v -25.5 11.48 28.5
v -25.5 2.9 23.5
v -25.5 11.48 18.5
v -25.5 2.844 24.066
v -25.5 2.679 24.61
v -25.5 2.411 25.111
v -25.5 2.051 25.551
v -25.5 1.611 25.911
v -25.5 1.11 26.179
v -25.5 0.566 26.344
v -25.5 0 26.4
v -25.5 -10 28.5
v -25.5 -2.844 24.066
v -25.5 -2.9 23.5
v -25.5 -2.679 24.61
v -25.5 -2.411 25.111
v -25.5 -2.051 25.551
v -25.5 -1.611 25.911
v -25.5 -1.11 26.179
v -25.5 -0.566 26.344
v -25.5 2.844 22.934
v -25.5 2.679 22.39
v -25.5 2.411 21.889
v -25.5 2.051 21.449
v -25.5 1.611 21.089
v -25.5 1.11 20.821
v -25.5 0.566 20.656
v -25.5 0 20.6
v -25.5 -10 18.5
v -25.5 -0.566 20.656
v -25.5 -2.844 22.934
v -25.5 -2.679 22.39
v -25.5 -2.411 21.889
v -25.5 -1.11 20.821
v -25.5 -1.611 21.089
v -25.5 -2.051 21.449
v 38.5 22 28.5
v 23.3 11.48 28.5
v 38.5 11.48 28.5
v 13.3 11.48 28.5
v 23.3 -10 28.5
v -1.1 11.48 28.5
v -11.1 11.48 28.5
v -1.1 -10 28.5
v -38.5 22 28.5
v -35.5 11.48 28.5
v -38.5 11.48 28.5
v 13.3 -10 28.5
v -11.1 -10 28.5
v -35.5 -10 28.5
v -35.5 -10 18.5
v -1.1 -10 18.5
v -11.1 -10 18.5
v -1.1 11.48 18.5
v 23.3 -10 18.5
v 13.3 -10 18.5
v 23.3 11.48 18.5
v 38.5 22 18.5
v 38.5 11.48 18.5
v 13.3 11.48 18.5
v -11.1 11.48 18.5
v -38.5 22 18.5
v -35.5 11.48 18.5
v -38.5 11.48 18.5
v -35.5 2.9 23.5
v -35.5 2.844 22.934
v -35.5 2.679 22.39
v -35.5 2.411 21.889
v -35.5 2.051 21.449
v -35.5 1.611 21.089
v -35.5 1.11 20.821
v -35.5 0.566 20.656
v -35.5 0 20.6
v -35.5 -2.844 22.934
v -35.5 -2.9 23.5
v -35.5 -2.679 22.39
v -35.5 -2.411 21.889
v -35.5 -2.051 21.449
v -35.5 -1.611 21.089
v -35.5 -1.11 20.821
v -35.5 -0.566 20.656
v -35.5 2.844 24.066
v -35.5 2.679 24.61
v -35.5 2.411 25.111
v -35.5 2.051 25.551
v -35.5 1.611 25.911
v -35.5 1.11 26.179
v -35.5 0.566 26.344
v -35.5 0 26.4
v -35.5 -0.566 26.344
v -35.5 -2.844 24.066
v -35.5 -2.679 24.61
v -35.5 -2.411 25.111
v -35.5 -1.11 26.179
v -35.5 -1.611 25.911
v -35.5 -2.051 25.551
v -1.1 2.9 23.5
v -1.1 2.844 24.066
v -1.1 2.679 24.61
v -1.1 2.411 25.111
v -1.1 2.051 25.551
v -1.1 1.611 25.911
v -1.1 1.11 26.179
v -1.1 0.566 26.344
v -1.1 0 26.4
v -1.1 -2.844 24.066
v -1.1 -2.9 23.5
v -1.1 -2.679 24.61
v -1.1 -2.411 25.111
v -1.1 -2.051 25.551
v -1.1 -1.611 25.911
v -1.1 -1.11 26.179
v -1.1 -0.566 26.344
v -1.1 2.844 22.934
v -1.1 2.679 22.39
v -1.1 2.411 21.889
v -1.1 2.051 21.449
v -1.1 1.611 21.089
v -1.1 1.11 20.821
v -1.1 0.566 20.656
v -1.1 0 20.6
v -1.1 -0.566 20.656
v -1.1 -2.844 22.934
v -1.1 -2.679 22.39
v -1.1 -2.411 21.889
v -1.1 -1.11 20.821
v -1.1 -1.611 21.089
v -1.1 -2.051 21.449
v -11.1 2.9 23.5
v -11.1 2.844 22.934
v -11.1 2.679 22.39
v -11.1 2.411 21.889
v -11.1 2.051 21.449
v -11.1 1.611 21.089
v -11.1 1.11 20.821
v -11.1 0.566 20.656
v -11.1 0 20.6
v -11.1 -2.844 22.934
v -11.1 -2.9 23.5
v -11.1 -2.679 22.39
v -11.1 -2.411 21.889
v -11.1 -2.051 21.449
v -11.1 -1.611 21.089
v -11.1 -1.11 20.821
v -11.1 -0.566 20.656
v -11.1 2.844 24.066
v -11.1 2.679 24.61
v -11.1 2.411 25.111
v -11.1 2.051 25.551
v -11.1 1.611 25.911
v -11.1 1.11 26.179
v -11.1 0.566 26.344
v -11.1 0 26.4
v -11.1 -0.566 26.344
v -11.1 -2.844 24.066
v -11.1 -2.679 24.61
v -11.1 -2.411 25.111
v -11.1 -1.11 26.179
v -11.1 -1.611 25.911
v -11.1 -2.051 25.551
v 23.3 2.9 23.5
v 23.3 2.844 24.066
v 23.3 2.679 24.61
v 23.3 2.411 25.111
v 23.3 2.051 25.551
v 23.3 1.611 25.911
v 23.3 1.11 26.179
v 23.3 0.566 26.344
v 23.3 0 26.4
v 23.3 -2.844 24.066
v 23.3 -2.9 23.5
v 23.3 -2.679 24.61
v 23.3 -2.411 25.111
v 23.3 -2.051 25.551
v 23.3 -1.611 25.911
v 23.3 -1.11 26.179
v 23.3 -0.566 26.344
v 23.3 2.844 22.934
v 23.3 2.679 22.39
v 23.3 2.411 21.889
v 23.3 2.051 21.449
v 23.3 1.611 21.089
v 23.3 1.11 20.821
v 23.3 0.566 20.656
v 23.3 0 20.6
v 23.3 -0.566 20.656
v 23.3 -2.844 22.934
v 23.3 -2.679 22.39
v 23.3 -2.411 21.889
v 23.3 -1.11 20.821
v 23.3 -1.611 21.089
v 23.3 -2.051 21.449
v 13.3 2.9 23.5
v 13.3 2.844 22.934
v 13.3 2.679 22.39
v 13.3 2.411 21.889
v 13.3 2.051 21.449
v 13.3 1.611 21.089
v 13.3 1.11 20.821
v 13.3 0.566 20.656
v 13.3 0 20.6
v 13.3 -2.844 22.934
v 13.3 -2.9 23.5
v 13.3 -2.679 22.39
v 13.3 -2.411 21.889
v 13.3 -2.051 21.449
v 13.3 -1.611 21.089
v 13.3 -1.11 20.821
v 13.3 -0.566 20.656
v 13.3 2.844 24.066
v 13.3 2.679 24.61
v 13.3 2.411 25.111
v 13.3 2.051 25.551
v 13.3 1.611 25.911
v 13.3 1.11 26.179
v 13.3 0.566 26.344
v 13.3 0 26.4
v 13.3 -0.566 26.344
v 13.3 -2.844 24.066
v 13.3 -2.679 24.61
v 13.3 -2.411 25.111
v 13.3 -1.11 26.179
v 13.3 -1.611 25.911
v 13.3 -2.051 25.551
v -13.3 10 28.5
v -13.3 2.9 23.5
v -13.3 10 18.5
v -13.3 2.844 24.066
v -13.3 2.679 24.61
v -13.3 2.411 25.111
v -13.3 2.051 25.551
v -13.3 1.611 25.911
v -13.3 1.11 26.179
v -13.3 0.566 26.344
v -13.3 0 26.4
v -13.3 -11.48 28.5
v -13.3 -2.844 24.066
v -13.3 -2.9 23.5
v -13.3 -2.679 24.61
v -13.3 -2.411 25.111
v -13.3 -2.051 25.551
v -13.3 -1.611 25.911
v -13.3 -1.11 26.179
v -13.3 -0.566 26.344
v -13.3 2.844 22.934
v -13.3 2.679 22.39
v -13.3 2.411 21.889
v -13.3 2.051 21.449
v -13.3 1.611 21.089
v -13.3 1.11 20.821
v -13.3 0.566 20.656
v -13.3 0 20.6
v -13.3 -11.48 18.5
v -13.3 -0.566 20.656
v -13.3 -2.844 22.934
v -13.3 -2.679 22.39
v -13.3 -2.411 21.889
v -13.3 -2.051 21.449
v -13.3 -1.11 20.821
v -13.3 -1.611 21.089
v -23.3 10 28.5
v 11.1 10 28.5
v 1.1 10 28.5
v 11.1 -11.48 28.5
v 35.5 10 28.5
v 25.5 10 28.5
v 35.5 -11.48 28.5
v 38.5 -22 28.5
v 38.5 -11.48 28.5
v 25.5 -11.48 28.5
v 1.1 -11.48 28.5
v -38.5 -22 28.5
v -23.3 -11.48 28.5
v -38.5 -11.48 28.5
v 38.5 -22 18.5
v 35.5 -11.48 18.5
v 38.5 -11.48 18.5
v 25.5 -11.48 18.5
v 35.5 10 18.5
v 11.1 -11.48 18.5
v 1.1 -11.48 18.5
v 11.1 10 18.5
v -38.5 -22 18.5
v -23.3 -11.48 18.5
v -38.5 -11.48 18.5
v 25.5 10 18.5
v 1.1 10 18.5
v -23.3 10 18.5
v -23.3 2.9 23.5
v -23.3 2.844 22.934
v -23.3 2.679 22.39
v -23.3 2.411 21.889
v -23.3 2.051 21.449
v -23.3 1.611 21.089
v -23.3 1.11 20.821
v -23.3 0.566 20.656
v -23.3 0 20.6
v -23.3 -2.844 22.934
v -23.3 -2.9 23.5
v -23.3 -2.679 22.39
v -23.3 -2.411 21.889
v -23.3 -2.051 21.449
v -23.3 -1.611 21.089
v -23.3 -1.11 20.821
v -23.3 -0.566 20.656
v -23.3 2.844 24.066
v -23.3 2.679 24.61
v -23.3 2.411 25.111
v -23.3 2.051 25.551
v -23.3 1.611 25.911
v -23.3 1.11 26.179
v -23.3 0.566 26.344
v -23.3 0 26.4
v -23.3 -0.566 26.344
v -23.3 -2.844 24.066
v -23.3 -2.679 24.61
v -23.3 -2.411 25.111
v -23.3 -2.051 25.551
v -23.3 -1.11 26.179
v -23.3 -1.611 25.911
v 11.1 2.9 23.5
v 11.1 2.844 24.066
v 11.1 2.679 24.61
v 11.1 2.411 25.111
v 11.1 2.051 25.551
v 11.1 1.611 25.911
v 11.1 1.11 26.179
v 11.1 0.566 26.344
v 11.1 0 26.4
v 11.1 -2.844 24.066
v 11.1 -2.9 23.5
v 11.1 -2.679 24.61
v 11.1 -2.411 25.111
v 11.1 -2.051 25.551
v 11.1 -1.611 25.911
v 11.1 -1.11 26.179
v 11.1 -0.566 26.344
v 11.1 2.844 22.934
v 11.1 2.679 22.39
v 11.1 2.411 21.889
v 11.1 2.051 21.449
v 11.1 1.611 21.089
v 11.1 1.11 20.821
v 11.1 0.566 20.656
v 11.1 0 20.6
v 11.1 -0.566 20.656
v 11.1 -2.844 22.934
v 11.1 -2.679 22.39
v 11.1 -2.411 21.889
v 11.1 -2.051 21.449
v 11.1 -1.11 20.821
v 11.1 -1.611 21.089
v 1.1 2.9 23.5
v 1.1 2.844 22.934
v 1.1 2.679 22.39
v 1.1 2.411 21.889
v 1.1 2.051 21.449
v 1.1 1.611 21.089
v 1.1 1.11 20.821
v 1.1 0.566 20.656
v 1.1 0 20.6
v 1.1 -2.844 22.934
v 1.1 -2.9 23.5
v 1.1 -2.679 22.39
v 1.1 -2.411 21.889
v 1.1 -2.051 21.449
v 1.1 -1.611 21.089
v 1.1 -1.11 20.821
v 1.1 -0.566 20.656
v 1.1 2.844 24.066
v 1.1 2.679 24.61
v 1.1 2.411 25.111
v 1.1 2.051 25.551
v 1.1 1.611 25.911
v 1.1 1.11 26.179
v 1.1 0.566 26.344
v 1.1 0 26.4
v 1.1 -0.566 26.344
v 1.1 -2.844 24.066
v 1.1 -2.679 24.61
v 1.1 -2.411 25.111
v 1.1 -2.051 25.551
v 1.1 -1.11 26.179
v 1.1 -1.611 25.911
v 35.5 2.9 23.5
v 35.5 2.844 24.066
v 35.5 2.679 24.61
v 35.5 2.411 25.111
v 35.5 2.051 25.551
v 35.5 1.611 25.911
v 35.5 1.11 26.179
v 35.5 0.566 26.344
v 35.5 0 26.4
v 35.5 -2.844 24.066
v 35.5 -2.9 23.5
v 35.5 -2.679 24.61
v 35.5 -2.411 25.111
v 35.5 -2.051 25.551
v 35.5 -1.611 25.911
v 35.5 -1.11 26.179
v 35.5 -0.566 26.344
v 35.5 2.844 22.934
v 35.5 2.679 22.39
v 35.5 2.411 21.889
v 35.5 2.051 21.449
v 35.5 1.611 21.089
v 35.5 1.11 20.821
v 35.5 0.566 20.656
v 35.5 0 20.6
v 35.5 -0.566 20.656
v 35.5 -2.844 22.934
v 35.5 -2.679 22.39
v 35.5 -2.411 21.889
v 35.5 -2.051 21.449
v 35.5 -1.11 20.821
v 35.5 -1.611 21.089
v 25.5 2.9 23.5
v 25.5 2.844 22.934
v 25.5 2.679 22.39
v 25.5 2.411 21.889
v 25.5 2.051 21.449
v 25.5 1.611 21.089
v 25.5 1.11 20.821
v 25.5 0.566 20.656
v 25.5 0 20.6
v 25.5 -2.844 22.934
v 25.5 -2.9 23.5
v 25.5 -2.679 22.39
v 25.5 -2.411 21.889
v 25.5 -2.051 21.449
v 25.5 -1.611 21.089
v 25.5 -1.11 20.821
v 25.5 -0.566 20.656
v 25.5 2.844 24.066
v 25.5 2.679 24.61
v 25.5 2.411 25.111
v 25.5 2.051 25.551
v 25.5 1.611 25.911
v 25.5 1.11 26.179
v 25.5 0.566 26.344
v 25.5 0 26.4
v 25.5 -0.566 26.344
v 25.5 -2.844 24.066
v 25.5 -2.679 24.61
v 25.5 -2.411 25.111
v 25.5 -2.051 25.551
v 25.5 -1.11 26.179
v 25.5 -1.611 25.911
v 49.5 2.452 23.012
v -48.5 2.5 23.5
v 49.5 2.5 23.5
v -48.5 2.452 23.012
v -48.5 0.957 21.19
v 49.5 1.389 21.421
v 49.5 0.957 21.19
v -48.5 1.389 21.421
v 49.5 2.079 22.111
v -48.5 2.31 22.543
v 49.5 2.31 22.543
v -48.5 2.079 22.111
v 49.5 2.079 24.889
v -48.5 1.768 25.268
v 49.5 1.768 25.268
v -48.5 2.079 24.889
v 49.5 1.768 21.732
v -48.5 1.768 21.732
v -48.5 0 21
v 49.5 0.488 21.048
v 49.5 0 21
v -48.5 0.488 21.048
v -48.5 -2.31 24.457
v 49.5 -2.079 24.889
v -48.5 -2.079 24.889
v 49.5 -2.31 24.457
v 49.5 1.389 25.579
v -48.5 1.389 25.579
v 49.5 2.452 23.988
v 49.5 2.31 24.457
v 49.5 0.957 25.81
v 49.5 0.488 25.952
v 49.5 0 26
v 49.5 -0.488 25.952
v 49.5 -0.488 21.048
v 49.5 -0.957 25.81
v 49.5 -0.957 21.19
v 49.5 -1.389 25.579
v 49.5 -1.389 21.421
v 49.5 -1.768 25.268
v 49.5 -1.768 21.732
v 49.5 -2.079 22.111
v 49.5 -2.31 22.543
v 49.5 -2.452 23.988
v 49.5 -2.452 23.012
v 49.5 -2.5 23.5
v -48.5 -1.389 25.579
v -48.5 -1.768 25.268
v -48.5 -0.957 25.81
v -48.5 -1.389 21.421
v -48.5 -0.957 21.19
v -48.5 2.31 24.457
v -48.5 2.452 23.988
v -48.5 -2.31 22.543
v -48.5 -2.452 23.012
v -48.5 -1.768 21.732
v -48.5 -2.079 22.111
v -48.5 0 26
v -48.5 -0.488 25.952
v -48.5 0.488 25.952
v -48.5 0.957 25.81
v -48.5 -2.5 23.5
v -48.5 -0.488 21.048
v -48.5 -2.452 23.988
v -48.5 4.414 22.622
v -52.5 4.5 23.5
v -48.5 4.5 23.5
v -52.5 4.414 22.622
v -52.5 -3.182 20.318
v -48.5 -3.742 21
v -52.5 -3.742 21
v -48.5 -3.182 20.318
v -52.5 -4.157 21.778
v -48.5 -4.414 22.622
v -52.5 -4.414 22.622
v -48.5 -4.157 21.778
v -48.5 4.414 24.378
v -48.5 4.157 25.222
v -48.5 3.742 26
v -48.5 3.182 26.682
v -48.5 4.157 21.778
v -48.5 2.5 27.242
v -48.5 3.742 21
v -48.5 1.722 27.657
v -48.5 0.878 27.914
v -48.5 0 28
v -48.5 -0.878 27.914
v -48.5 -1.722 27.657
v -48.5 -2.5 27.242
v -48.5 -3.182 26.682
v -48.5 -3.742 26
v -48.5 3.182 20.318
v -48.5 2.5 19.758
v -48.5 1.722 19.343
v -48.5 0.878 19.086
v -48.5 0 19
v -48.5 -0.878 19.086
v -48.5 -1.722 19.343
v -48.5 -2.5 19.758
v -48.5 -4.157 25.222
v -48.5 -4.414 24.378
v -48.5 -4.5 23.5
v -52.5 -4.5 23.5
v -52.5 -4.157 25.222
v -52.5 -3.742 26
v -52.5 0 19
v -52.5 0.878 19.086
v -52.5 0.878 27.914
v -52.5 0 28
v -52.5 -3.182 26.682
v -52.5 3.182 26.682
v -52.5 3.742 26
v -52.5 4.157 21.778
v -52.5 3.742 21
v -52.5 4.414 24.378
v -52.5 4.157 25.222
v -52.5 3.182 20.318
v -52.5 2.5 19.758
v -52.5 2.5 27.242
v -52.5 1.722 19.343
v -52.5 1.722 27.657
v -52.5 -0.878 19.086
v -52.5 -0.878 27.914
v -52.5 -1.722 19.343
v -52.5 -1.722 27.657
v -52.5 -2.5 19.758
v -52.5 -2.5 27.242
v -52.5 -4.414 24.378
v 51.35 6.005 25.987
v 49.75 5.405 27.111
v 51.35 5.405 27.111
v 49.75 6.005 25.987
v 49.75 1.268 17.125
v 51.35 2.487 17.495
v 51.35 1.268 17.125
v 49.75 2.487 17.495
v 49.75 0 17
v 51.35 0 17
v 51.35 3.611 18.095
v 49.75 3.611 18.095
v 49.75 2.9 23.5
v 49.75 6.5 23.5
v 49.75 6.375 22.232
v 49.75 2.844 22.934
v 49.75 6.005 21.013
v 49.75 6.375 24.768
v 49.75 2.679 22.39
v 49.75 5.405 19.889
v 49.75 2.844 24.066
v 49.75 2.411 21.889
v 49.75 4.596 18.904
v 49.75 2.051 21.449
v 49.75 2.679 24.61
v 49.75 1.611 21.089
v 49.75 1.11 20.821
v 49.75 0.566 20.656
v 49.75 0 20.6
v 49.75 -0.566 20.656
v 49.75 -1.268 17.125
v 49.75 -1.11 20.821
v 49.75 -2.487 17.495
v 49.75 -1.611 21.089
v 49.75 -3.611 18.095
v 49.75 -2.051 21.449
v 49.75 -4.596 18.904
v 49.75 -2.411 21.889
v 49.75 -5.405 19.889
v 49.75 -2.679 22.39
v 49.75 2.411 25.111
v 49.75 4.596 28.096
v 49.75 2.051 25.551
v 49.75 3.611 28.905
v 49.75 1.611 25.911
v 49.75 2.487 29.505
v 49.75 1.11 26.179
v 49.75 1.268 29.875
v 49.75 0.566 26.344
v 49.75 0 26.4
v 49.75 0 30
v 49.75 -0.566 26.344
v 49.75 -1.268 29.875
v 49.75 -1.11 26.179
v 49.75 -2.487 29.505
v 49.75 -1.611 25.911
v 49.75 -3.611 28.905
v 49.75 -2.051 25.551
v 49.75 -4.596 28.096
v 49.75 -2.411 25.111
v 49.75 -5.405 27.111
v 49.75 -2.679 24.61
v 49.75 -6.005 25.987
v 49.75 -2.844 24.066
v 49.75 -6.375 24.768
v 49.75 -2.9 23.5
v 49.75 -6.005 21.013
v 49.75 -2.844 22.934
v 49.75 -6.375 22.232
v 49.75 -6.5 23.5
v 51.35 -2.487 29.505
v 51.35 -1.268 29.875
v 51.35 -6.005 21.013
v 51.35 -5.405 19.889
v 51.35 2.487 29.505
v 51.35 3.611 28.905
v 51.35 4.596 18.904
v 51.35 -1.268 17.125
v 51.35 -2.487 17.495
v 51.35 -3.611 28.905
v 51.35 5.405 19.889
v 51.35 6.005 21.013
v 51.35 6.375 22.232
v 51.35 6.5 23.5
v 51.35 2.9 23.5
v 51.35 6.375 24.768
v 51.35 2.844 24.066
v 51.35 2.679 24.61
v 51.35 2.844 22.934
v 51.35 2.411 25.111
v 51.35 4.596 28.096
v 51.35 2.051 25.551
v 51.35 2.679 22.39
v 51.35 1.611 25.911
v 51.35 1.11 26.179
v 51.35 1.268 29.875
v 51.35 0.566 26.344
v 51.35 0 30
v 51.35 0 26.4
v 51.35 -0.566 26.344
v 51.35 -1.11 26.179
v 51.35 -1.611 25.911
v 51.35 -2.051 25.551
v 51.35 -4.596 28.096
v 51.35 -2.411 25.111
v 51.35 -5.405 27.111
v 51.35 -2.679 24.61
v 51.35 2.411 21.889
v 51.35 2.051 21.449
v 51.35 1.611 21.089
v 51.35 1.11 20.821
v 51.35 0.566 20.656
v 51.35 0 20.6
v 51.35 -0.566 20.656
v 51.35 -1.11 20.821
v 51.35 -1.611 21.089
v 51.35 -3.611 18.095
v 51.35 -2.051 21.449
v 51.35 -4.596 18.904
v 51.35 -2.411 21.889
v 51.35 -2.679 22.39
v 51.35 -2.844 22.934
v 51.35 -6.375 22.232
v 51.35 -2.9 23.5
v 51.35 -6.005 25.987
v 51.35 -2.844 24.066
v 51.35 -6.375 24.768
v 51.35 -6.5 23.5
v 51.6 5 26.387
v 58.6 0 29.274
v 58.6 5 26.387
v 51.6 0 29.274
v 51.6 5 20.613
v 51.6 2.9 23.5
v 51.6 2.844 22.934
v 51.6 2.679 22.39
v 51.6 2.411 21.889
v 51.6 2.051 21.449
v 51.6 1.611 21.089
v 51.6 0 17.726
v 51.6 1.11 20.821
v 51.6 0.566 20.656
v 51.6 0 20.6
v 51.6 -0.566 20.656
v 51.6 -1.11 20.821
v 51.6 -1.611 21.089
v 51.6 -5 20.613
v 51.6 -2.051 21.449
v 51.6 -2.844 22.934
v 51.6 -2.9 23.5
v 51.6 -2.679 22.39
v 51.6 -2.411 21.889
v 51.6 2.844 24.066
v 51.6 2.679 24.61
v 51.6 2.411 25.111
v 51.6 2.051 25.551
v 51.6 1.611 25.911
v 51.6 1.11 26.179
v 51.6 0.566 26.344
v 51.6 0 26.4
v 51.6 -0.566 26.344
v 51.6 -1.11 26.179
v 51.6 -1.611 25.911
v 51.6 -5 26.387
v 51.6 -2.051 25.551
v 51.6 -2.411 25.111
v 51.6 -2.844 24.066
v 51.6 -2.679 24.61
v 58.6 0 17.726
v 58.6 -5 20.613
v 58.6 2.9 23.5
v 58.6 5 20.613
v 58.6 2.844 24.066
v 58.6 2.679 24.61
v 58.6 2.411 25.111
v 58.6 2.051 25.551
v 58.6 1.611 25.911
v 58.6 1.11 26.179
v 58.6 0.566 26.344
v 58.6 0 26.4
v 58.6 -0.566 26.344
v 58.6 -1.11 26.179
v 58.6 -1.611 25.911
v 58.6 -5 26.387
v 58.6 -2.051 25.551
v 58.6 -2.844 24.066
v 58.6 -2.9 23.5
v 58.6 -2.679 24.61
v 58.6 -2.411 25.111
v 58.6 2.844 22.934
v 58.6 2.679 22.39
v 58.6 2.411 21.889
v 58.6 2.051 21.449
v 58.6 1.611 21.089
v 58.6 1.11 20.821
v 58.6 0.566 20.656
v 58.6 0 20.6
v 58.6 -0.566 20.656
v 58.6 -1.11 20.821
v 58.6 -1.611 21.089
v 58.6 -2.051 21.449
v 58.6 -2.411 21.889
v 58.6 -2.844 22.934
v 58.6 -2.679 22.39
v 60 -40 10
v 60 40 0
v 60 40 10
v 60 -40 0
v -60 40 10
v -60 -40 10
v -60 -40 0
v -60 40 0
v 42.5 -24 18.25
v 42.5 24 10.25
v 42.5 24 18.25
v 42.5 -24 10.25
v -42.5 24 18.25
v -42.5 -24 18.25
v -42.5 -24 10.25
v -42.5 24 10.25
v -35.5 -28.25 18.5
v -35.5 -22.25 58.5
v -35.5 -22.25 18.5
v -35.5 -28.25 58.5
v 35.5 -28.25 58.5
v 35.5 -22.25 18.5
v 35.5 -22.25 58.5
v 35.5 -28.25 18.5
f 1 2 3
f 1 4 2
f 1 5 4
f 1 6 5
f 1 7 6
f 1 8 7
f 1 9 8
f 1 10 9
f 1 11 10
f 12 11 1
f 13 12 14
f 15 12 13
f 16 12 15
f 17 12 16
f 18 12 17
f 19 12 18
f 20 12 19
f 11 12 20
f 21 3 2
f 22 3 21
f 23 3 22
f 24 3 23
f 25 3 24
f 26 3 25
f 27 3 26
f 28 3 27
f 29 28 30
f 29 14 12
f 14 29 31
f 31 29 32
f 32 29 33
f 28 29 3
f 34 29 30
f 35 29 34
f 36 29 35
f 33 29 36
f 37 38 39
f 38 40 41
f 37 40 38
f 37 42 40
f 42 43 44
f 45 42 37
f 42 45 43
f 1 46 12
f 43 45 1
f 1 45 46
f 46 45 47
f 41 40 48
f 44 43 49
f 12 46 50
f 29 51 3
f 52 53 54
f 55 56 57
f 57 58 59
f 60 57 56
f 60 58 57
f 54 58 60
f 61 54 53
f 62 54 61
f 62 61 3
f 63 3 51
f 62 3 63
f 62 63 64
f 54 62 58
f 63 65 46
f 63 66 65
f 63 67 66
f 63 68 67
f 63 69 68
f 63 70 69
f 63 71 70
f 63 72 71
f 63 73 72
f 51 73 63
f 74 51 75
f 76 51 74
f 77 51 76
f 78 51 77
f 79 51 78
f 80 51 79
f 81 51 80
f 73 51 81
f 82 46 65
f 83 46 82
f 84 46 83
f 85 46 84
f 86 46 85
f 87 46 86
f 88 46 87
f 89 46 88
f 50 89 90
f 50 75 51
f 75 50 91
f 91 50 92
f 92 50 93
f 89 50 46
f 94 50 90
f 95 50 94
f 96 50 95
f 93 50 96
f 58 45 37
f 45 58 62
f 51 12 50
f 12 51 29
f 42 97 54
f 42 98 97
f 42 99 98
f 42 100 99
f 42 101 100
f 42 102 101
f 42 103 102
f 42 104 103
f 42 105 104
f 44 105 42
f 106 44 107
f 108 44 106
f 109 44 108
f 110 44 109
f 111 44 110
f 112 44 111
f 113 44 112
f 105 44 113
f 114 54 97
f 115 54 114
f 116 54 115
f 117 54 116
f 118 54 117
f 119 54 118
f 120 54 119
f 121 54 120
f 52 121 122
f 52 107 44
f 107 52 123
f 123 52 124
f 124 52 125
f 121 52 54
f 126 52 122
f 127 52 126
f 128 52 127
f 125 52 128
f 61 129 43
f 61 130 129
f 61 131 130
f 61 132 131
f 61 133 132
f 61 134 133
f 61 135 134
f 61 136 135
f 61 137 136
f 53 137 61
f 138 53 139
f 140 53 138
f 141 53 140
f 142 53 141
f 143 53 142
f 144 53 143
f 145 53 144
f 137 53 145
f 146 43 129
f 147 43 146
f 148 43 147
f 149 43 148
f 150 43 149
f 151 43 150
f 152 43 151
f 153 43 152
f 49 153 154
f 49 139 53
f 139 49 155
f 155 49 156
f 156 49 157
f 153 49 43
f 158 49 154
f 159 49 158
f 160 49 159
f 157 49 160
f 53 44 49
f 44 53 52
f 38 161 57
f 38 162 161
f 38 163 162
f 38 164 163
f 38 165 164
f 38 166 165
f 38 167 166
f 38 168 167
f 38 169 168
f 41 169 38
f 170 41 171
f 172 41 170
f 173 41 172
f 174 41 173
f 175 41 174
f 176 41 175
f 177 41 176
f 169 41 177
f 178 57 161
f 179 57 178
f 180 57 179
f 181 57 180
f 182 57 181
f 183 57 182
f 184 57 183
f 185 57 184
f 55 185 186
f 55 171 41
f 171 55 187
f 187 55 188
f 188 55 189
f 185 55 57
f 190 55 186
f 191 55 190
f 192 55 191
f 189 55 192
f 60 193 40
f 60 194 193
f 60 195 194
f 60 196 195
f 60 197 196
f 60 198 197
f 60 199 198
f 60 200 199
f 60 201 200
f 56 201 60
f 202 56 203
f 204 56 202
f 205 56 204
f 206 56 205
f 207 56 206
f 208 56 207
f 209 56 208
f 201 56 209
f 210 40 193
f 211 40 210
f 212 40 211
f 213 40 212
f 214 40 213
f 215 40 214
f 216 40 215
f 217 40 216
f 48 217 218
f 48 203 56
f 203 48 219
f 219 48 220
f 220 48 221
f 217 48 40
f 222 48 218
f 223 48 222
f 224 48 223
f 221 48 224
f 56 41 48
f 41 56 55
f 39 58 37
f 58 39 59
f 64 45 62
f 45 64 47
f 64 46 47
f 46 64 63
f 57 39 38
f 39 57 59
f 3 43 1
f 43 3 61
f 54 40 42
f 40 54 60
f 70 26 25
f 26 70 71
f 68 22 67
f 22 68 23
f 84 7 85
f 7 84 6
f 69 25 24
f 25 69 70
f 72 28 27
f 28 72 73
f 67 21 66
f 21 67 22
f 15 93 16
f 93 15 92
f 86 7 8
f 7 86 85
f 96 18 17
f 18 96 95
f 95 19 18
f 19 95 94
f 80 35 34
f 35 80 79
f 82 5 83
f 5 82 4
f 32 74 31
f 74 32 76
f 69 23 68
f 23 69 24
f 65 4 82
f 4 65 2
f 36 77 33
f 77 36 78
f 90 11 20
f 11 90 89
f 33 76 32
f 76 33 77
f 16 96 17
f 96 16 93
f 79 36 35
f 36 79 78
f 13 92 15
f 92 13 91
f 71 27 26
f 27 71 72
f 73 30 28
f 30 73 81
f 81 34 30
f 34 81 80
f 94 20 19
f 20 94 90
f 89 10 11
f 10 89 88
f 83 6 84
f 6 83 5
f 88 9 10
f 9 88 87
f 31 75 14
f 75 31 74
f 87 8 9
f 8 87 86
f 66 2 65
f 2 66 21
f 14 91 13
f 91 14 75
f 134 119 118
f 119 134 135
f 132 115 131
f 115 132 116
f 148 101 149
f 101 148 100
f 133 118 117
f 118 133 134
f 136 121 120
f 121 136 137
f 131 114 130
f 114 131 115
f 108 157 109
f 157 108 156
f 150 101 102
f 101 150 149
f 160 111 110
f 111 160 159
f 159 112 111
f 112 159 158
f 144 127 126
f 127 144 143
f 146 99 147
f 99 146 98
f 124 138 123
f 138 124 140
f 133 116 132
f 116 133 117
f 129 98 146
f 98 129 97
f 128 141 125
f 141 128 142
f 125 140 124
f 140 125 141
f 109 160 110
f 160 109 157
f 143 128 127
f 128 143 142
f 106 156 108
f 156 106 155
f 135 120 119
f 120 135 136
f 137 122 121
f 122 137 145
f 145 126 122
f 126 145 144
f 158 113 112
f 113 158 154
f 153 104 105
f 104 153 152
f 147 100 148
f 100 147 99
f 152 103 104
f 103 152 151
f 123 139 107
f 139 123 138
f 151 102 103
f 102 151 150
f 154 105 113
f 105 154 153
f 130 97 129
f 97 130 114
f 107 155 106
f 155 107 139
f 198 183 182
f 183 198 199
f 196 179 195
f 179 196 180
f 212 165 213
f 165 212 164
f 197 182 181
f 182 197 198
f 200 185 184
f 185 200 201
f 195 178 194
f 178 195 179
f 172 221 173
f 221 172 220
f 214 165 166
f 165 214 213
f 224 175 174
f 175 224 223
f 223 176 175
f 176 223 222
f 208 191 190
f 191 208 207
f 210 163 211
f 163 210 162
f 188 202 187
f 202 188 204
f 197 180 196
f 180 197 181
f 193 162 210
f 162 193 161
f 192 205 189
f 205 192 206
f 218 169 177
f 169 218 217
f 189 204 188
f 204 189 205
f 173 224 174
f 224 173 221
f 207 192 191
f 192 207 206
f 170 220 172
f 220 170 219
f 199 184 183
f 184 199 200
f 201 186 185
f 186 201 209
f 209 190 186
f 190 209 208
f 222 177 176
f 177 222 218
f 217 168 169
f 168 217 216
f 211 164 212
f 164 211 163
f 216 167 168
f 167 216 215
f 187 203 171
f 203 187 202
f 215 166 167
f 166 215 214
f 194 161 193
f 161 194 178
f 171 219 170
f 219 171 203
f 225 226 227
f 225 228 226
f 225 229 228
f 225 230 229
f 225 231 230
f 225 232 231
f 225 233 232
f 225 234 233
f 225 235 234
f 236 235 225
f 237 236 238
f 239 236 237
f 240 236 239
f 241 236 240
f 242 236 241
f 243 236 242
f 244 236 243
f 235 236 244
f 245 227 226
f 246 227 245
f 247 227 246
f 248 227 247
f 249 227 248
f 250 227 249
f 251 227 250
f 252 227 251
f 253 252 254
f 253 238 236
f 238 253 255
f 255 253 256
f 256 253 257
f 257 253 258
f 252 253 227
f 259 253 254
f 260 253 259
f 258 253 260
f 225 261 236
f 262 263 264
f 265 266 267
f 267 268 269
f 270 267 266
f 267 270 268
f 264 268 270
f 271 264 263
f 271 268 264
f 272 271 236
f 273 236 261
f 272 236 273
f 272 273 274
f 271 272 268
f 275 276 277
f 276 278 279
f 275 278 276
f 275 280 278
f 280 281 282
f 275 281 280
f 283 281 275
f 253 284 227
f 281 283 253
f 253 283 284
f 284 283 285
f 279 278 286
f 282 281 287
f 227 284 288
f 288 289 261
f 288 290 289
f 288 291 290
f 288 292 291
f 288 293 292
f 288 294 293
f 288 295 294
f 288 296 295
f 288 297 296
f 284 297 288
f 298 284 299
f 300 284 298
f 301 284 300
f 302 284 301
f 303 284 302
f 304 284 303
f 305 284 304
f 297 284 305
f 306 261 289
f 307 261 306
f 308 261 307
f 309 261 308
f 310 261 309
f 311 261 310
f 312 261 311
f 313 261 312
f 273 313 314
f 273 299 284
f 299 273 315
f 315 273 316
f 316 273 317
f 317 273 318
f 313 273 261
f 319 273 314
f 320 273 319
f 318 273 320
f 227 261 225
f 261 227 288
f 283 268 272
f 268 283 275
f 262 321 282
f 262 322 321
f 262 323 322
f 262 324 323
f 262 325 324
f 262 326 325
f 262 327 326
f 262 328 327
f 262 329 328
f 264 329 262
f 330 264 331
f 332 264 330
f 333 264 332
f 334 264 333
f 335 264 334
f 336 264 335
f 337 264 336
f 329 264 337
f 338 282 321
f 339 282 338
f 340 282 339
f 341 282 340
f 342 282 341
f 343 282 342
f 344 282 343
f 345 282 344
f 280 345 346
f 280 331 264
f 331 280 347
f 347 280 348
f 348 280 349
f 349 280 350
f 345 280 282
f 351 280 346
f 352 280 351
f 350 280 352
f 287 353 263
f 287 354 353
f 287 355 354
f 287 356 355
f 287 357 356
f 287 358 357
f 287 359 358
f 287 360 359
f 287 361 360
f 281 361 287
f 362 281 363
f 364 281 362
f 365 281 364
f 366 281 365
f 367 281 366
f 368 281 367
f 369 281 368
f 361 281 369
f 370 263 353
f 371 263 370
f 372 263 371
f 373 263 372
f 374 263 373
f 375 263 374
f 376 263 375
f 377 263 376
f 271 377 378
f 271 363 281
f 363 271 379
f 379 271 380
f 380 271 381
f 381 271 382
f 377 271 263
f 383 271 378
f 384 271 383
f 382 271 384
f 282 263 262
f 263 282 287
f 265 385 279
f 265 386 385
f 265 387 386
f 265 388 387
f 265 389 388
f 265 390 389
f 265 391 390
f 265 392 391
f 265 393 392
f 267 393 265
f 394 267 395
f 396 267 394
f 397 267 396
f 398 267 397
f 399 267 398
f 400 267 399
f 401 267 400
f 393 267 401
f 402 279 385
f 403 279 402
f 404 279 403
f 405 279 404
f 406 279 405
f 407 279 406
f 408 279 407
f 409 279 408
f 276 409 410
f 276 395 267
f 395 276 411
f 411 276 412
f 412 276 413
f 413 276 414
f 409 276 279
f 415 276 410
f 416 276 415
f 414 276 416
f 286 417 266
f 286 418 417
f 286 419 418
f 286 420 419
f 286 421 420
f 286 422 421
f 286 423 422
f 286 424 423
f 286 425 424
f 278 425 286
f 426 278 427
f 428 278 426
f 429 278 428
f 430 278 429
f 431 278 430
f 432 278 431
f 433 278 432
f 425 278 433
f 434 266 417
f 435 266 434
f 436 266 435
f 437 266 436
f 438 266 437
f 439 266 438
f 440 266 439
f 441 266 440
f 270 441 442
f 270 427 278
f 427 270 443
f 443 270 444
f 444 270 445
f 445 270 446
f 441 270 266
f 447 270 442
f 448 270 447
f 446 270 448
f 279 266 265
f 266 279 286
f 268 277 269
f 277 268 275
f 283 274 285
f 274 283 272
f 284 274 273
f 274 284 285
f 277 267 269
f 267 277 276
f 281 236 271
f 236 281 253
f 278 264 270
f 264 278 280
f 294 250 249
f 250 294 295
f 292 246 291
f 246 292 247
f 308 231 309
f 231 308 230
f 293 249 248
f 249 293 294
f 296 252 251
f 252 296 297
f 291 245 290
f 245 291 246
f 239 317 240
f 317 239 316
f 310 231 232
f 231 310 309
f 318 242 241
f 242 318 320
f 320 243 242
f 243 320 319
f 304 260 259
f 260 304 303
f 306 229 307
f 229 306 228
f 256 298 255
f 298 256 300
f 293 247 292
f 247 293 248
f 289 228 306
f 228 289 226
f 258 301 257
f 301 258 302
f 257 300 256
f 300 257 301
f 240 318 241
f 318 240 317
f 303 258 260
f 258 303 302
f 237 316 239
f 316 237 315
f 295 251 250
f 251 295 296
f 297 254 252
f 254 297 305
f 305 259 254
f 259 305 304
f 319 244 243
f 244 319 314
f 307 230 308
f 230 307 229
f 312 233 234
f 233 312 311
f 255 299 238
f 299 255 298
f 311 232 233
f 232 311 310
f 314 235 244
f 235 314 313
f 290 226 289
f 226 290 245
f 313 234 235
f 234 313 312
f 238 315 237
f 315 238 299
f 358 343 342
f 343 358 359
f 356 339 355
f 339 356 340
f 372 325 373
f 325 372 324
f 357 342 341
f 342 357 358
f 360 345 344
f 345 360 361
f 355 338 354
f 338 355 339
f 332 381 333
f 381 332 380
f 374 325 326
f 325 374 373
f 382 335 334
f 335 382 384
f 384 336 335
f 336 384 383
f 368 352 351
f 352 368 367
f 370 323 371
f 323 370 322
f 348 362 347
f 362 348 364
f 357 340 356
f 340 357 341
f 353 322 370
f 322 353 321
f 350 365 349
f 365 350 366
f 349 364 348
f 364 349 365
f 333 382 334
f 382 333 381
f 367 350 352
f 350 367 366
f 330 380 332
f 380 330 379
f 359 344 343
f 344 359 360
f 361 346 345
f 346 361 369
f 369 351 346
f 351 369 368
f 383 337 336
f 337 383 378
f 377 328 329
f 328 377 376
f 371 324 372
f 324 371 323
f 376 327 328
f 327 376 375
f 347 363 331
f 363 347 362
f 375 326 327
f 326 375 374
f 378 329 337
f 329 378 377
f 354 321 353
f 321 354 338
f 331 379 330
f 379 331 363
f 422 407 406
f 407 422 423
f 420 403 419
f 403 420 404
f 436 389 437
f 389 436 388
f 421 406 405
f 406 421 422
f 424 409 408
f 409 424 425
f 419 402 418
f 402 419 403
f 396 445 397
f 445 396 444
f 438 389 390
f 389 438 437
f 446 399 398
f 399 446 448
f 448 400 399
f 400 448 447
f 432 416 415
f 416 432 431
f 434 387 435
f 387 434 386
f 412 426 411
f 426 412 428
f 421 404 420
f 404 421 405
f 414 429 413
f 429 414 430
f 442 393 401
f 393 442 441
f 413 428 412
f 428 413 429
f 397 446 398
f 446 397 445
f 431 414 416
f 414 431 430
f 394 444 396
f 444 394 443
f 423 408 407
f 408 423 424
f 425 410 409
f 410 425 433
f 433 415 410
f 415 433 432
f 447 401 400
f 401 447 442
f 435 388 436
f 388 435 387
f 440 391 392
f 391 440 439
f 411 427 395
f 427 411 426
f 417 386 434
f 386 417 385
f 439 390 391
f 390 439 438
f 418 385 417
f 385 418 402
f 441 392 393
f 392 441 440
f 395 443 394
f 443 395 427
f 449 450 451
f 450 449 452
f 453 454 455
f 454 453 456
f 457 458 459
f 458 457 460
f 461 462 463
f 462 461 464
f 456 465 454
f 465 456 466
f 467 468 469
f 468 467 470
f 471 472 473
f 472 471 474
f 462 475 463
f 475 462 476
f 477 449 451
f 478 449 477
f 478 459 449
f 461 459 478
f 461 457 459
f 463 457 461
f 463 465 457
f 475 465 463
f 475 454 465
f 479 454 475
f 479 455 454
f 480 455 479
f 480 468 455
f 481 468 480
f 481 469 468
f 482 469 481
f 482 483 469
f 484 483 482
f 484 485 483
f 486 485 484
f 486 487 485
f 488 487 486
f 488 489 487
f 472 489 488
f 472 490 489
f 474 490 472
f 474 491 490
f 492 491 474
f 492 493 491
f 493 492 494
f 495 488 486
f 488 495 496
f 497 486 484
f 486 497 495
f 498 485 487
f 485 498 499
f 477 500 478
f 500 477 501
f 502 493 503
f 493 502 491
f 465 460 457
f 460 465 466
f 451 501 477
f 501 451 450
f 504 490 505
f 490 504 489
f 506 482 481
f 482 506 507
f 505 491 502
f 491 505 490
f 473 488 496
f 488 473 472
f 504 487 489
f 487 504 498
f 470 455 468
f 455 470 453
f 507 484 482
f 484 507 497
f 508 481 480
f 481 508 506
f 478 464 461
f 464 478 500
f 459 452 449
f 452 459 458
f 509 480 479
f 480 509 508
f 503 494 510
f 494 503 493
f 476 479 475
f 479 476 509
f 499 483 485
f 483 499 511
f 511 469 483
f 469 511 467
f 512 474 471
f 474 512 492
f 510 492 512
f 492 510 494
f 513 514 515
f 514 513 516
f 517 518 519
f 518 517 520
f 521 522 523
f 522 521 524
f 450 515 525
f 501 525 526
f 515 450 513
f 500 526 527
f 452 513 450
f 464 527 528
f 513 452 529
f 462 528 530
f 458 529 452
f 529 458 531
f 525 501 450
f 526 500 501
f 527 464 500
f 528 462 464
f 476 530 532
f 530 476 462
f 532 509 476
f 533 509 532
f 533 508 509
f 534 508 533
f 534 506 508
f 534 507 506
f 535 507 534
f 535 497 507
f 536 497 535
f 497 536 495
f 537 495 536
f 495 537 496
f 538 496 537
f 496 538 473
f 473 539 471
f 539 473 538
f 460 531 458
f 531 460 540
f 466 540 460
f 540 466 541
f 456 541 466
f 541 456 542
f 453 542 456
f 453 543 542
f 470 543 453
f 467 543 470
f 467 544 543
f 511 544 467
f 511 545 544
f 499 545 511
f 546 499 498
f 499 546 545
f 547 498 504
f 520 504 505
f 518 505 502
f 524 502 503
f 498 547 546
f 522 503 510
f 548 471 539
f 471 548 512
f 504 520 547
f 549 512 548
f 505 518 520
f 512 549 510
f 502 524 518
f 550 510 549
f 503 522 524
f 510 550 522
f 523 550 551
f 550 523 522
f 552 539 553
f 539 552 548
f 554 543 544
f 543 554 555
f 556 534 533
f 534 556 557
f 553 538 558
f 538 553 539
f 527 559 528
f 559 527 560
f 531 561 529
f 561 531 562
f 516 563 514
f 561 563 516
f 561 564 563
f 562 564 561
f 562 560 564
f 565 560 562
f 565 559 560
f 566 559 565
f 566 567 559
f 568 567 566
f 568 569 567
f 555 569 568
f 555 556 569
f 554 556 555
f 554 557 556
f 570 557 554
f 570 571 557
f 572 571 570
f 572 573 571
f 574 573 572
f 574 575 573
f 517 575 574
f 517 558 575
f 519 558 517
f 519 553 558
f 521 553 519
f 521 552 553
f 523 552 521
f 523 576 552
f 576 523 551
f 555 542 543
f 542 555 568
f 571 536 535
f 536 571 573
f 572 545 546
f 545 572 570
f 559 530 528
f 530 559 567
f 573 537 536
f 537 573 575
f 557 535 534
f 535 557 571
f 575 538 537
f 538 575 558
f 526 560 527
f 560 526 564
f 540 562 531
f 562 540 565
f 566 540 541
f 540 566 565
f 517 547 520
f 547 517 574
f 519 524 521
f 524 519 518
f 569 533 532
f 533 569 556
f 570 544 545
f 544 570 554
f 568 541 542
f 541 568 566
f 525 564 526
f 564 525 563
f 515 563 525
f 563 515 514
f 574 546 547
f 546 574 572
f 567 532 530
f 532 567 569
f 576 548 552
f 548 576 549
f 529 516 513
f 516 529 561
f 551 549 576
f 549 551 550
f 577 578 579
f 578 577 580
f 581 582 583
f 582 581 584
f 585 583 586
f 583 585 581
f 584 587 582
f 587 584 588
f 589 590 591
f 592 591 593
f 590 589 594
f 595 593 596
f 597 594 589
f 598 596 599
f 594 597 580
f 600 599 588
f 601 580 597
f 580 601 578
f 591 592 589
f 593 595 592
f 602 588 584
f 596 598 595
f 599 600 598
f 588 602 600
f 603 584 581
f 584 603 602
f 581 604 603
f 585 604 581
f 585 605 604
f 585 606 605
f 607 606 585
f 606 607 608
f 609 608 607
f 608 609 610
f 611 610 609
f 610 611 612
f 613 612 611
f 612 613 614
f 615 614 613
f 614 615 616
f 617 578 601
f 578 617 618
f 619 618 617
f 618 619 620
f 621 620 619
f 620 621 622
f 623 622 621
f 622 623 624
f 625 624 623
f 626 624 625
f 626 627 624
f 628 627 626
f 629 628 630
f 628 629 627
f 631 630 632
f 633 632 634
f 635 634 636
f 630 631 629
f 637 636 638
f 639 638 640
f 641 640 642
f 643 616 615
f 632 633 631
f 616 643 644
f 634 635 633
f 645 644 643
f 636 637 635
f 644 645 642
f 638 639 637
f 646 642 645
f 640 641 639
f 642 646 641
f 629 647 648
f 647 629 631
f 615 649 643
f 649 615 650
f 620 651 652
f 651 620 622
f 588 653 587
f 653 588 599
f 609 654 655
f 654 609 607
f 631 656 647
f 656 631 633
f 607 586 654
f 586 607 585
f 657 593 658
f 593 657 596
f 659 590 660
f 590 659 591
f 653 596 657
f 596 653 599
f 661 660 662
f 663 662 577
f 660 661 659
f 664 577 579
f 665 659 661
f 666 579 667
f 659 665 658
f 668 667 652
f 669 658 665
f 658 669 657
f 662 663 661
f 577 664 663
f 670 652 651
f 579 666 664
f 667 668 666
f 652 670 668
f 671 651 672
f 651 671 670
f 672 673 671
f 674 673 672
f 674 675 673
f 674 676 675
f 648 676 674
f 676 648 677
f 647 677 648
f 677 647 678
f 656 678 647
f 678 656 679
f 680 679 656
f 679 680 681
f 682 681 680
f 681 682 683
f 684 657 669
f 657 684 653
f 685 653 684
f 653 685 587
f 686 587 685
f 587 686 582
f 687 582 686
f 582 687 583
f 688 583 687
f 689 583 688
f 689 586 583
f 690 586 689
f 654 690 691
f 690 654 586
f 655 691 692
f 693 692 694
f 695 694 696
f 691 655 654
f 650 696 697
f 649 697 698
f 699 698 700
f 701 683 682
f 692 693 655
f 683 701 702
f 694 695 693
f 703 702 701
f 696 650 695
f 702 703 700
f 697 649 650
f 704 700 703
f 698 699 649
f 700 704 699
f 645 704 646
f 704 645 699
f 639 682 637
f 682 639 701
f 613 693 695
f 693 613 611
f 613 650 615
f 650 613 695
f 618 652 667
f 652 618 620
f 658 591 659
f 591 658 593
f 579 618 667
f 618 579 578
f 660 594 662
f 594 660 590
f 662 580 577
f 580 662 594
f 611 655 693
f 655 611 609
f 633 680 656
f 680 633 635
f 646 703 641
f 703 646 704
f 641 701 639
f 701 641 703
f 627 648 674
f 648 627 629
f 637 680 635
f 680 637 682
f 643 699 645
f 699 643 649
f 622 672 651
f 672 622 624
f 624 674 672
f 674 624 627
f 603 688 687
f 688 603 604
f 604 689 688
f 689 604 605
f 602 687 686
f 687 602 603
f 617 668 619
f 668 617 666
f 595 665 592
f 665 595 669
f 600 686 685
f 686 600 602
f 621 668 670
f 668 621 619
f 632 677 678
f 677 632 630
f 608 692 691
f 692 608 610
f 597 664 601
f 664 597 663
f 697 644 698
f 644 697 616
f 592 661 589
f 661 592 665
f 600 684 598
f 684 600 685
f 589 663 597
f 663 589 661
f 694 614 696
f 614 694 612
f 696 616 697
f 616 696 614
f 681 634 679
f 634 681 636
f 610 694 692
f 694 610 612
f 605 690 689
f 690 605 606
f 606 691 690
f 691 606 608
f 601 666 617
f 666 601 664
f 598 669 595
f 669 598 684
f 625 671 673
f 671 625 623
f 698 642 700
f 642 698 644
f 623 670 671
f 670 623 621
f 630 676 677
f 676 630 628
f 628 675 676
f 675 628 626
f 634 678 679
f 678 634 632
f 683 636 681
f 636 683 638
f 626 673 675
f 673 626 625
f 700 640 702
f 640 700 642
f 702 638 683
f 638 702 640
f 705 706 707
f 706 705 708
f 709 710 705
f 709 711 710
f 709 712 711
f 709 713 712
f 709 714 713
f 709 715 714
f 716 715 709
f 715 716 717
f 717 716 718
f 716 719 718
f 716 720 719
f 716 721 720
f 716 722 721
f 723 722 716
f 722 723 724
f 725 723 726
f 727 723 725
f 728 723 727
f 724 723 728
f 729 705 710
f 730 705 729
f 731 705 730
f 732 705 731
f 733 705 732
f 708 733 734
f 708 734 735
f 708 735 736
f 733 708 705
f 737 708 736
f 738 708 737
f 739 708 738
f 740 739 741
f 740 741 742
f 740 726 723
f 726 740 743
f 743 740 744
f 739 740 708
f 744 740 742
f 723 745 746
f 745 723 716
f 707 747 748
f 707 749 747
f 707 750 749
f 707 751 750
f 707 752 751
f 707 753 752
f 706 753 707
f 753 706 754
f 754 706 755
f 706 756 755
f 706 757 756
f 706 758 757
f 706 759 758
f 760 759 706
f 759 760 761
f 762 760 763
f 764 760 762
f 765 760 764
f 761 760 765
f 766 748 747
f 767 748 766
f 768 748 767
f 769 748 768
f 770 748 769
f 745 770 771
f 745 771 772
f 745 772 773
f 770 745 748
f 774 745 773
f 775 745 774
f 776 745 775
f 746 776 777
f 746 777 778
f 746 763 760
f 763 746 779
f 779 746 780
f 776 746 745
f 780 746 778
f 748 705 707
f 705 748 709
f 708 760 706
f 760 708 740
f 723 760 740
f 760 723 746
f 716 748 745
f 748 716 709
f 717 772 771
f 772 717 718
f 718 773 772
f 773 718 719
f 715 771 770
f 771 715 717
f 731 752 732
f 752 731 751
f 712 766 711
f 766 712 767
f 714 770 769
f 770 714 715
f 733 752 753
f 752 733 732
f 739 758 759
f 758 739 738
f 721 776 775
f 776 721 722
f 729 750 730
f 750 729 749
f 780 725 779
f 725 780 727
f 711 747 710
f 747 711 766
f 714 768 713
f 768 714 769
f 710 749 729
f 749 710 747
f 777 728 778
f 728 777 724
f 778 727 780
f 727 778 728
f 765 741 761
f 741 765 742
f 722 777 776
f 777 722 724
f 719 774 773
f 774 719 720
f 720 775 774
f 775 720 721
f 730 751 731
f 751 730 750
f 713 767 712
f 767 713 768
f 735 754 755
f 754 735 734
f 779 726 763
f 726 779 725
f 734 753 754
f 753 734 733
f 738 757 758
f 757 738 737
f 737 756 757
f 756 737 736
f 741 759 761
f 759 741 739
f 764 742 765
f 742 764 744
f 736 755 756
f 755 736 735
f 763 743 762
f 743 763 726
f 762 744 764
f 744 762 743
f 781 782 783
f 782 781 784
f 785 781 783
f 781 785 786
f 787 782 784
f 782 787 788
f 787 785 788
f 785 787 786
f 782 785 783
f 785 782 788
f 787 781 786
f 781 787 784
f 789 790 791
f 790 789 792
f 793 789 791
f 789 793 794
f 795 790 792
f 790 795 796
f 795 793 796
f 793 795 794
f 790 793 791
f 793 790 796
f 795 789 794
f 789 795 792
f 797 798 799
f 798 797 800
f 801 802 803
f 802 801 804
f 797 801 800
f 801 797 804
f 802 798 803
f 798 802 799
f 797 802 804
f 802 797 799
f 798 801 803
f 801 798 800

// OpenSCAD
$fn = 32;

// ------------------------------------------------------------------------
// Comb hinge with flap: leaf 77 x 22 mm, pin d5, flap 40 mm
// Every part is its own module, assembly() places every instance.
// ------------------------------------------------------------------------

// --- part 1 ---
module hinge_bed() {
  difference() {
    translate([-60, -40, 0]) cube([120, 80, 10]);
  }
}

// --- part 2 ---
module hinge_riser() {
  difference() {
    translate([-42.5, -24, 0]) cube([85, 48, 8]);
  }
}

// --- part 3 ---
module hinge_leaf_a() {
  difference() {
    union() {
      translate([-35.5, -10, -5]) cube([10, 32, 10]);
      translate([-11.1, -10, -5]) cube([10, 32, 10]);
      translate([13.3, -10, -5]) cube([10, 32, 10]);
      translate([-38.5, 11.48, -5]) cube([77, 10.52, 10]);
    }
    translate([-30.5, 0, 0]) rotate([0, 90, 0]) cylinder(h = 12, d = 5.8, center = true);
    translate([-6.1, 0, 0]) rotate([0, 90, 0]) cylinder(h = 12, d = 5.8, center = true);
    translate([18.3, 0, 0]) rotate([0, 90, 0]) cylinder(h = 12, d = 5.8, center = true);
  }
}

// --- part 4 ---
module hinge_leaf_b() {
  difference() {
    union() {
      translate([-23.3, -22, -5]) cube([10, 32, 10]);
      translate([1.1, -22, -5]) cube([10, 32, 10]);
      translate([25.5, -22, -5]) cube([10, 32, 10]);
      translate([-38.5, -22, -5]) cube([77, 10.52, 10]);
    }
    translate([-18.3, 0, 0]) rotate([0, 90, 0]) cylinder(h = 12, d = 5.8, center = true);
    translate([6.1, 0, 0]) rotate([0, 90, 0]) cylinder(h = 12, d = 5.8, center = true);
    translate([30.5, 0, 0]) rotate([0, 90, 0]) cylinder(h = 12, d = 5.8, center = true);
  }
}

// --- part 5 ---
module hinge_flap() {
  difference() {
    translate([-35.5, -20, 0]) cube([71, 40, 6]);
  }
}

// --- part 6 ---
module hinge_pin() {
  rotate([0, 90, 0]) cylinder(h = 99, d = 5, center = true);
  translate([-52.5, 0, 0]) rotate([0, 90, 0]) cylinder(h = 4, d = 9);
}

// --- part 7 ---
module pin_washer() {
  difference() {
      translate([0, 0, 0]) cylinder(h = 1.6, d = 13);
      translate([0, 0, -1]) cylinder(h = 3.6, d = 5.8);
    }
}

// --- part 8 ---
module pin_nut() {
  difference() {
    linear_extrude(height = 7) polygon(points = [[5.774, 0], [2.887, 5], [-2.887, 5], [-5.774, 0], [-2.887, -5], [2.887, -5]]);
    translate([0, 0, -1]) cylinder(h = 9, d = 5.8);
  }
}

// --- assembly ---
module assembly() {
  color([0.80, 0.24, 0.20]) translate([0, 0, 0]) rotate([0, 0, 0]) hinge_bed();
  color([0.20, 0.45, 0.75]) translate([0, 0, 10.25]) rotate([0, 0, 0]) hinge_riser();
  color([0.25, 0.62, 0.32]) translate([0, 0, 23.5]) rotate([0, 0, 0]) hinge_leaf_a();
  color([0.92, 0.70, 0.18]) translate([0, 0, 23.5]) rotate([0, 0, 0]) hinge_leaf_b();
  color([0.58, 0.35, 0.70]) translate([0, -22.25, 38.5]) rotate([90, 0, 0]) hinge_flap();
  color([0.16, 0.66, 0.66]) translate([0, 0, 23.5]) rotate([0, 0, 0]) hinge_pin();
  color([0.85, 0.48, 0.18]) translate([49.75, 0, 23.5]) rotate([0, 90, 0]) pin_washer();
  color([0.55, 0.60, 0.65]) translate([51.6, 0, 23.5]) rotate([0, 90, 0]) pin_nut();
}

assembly();
